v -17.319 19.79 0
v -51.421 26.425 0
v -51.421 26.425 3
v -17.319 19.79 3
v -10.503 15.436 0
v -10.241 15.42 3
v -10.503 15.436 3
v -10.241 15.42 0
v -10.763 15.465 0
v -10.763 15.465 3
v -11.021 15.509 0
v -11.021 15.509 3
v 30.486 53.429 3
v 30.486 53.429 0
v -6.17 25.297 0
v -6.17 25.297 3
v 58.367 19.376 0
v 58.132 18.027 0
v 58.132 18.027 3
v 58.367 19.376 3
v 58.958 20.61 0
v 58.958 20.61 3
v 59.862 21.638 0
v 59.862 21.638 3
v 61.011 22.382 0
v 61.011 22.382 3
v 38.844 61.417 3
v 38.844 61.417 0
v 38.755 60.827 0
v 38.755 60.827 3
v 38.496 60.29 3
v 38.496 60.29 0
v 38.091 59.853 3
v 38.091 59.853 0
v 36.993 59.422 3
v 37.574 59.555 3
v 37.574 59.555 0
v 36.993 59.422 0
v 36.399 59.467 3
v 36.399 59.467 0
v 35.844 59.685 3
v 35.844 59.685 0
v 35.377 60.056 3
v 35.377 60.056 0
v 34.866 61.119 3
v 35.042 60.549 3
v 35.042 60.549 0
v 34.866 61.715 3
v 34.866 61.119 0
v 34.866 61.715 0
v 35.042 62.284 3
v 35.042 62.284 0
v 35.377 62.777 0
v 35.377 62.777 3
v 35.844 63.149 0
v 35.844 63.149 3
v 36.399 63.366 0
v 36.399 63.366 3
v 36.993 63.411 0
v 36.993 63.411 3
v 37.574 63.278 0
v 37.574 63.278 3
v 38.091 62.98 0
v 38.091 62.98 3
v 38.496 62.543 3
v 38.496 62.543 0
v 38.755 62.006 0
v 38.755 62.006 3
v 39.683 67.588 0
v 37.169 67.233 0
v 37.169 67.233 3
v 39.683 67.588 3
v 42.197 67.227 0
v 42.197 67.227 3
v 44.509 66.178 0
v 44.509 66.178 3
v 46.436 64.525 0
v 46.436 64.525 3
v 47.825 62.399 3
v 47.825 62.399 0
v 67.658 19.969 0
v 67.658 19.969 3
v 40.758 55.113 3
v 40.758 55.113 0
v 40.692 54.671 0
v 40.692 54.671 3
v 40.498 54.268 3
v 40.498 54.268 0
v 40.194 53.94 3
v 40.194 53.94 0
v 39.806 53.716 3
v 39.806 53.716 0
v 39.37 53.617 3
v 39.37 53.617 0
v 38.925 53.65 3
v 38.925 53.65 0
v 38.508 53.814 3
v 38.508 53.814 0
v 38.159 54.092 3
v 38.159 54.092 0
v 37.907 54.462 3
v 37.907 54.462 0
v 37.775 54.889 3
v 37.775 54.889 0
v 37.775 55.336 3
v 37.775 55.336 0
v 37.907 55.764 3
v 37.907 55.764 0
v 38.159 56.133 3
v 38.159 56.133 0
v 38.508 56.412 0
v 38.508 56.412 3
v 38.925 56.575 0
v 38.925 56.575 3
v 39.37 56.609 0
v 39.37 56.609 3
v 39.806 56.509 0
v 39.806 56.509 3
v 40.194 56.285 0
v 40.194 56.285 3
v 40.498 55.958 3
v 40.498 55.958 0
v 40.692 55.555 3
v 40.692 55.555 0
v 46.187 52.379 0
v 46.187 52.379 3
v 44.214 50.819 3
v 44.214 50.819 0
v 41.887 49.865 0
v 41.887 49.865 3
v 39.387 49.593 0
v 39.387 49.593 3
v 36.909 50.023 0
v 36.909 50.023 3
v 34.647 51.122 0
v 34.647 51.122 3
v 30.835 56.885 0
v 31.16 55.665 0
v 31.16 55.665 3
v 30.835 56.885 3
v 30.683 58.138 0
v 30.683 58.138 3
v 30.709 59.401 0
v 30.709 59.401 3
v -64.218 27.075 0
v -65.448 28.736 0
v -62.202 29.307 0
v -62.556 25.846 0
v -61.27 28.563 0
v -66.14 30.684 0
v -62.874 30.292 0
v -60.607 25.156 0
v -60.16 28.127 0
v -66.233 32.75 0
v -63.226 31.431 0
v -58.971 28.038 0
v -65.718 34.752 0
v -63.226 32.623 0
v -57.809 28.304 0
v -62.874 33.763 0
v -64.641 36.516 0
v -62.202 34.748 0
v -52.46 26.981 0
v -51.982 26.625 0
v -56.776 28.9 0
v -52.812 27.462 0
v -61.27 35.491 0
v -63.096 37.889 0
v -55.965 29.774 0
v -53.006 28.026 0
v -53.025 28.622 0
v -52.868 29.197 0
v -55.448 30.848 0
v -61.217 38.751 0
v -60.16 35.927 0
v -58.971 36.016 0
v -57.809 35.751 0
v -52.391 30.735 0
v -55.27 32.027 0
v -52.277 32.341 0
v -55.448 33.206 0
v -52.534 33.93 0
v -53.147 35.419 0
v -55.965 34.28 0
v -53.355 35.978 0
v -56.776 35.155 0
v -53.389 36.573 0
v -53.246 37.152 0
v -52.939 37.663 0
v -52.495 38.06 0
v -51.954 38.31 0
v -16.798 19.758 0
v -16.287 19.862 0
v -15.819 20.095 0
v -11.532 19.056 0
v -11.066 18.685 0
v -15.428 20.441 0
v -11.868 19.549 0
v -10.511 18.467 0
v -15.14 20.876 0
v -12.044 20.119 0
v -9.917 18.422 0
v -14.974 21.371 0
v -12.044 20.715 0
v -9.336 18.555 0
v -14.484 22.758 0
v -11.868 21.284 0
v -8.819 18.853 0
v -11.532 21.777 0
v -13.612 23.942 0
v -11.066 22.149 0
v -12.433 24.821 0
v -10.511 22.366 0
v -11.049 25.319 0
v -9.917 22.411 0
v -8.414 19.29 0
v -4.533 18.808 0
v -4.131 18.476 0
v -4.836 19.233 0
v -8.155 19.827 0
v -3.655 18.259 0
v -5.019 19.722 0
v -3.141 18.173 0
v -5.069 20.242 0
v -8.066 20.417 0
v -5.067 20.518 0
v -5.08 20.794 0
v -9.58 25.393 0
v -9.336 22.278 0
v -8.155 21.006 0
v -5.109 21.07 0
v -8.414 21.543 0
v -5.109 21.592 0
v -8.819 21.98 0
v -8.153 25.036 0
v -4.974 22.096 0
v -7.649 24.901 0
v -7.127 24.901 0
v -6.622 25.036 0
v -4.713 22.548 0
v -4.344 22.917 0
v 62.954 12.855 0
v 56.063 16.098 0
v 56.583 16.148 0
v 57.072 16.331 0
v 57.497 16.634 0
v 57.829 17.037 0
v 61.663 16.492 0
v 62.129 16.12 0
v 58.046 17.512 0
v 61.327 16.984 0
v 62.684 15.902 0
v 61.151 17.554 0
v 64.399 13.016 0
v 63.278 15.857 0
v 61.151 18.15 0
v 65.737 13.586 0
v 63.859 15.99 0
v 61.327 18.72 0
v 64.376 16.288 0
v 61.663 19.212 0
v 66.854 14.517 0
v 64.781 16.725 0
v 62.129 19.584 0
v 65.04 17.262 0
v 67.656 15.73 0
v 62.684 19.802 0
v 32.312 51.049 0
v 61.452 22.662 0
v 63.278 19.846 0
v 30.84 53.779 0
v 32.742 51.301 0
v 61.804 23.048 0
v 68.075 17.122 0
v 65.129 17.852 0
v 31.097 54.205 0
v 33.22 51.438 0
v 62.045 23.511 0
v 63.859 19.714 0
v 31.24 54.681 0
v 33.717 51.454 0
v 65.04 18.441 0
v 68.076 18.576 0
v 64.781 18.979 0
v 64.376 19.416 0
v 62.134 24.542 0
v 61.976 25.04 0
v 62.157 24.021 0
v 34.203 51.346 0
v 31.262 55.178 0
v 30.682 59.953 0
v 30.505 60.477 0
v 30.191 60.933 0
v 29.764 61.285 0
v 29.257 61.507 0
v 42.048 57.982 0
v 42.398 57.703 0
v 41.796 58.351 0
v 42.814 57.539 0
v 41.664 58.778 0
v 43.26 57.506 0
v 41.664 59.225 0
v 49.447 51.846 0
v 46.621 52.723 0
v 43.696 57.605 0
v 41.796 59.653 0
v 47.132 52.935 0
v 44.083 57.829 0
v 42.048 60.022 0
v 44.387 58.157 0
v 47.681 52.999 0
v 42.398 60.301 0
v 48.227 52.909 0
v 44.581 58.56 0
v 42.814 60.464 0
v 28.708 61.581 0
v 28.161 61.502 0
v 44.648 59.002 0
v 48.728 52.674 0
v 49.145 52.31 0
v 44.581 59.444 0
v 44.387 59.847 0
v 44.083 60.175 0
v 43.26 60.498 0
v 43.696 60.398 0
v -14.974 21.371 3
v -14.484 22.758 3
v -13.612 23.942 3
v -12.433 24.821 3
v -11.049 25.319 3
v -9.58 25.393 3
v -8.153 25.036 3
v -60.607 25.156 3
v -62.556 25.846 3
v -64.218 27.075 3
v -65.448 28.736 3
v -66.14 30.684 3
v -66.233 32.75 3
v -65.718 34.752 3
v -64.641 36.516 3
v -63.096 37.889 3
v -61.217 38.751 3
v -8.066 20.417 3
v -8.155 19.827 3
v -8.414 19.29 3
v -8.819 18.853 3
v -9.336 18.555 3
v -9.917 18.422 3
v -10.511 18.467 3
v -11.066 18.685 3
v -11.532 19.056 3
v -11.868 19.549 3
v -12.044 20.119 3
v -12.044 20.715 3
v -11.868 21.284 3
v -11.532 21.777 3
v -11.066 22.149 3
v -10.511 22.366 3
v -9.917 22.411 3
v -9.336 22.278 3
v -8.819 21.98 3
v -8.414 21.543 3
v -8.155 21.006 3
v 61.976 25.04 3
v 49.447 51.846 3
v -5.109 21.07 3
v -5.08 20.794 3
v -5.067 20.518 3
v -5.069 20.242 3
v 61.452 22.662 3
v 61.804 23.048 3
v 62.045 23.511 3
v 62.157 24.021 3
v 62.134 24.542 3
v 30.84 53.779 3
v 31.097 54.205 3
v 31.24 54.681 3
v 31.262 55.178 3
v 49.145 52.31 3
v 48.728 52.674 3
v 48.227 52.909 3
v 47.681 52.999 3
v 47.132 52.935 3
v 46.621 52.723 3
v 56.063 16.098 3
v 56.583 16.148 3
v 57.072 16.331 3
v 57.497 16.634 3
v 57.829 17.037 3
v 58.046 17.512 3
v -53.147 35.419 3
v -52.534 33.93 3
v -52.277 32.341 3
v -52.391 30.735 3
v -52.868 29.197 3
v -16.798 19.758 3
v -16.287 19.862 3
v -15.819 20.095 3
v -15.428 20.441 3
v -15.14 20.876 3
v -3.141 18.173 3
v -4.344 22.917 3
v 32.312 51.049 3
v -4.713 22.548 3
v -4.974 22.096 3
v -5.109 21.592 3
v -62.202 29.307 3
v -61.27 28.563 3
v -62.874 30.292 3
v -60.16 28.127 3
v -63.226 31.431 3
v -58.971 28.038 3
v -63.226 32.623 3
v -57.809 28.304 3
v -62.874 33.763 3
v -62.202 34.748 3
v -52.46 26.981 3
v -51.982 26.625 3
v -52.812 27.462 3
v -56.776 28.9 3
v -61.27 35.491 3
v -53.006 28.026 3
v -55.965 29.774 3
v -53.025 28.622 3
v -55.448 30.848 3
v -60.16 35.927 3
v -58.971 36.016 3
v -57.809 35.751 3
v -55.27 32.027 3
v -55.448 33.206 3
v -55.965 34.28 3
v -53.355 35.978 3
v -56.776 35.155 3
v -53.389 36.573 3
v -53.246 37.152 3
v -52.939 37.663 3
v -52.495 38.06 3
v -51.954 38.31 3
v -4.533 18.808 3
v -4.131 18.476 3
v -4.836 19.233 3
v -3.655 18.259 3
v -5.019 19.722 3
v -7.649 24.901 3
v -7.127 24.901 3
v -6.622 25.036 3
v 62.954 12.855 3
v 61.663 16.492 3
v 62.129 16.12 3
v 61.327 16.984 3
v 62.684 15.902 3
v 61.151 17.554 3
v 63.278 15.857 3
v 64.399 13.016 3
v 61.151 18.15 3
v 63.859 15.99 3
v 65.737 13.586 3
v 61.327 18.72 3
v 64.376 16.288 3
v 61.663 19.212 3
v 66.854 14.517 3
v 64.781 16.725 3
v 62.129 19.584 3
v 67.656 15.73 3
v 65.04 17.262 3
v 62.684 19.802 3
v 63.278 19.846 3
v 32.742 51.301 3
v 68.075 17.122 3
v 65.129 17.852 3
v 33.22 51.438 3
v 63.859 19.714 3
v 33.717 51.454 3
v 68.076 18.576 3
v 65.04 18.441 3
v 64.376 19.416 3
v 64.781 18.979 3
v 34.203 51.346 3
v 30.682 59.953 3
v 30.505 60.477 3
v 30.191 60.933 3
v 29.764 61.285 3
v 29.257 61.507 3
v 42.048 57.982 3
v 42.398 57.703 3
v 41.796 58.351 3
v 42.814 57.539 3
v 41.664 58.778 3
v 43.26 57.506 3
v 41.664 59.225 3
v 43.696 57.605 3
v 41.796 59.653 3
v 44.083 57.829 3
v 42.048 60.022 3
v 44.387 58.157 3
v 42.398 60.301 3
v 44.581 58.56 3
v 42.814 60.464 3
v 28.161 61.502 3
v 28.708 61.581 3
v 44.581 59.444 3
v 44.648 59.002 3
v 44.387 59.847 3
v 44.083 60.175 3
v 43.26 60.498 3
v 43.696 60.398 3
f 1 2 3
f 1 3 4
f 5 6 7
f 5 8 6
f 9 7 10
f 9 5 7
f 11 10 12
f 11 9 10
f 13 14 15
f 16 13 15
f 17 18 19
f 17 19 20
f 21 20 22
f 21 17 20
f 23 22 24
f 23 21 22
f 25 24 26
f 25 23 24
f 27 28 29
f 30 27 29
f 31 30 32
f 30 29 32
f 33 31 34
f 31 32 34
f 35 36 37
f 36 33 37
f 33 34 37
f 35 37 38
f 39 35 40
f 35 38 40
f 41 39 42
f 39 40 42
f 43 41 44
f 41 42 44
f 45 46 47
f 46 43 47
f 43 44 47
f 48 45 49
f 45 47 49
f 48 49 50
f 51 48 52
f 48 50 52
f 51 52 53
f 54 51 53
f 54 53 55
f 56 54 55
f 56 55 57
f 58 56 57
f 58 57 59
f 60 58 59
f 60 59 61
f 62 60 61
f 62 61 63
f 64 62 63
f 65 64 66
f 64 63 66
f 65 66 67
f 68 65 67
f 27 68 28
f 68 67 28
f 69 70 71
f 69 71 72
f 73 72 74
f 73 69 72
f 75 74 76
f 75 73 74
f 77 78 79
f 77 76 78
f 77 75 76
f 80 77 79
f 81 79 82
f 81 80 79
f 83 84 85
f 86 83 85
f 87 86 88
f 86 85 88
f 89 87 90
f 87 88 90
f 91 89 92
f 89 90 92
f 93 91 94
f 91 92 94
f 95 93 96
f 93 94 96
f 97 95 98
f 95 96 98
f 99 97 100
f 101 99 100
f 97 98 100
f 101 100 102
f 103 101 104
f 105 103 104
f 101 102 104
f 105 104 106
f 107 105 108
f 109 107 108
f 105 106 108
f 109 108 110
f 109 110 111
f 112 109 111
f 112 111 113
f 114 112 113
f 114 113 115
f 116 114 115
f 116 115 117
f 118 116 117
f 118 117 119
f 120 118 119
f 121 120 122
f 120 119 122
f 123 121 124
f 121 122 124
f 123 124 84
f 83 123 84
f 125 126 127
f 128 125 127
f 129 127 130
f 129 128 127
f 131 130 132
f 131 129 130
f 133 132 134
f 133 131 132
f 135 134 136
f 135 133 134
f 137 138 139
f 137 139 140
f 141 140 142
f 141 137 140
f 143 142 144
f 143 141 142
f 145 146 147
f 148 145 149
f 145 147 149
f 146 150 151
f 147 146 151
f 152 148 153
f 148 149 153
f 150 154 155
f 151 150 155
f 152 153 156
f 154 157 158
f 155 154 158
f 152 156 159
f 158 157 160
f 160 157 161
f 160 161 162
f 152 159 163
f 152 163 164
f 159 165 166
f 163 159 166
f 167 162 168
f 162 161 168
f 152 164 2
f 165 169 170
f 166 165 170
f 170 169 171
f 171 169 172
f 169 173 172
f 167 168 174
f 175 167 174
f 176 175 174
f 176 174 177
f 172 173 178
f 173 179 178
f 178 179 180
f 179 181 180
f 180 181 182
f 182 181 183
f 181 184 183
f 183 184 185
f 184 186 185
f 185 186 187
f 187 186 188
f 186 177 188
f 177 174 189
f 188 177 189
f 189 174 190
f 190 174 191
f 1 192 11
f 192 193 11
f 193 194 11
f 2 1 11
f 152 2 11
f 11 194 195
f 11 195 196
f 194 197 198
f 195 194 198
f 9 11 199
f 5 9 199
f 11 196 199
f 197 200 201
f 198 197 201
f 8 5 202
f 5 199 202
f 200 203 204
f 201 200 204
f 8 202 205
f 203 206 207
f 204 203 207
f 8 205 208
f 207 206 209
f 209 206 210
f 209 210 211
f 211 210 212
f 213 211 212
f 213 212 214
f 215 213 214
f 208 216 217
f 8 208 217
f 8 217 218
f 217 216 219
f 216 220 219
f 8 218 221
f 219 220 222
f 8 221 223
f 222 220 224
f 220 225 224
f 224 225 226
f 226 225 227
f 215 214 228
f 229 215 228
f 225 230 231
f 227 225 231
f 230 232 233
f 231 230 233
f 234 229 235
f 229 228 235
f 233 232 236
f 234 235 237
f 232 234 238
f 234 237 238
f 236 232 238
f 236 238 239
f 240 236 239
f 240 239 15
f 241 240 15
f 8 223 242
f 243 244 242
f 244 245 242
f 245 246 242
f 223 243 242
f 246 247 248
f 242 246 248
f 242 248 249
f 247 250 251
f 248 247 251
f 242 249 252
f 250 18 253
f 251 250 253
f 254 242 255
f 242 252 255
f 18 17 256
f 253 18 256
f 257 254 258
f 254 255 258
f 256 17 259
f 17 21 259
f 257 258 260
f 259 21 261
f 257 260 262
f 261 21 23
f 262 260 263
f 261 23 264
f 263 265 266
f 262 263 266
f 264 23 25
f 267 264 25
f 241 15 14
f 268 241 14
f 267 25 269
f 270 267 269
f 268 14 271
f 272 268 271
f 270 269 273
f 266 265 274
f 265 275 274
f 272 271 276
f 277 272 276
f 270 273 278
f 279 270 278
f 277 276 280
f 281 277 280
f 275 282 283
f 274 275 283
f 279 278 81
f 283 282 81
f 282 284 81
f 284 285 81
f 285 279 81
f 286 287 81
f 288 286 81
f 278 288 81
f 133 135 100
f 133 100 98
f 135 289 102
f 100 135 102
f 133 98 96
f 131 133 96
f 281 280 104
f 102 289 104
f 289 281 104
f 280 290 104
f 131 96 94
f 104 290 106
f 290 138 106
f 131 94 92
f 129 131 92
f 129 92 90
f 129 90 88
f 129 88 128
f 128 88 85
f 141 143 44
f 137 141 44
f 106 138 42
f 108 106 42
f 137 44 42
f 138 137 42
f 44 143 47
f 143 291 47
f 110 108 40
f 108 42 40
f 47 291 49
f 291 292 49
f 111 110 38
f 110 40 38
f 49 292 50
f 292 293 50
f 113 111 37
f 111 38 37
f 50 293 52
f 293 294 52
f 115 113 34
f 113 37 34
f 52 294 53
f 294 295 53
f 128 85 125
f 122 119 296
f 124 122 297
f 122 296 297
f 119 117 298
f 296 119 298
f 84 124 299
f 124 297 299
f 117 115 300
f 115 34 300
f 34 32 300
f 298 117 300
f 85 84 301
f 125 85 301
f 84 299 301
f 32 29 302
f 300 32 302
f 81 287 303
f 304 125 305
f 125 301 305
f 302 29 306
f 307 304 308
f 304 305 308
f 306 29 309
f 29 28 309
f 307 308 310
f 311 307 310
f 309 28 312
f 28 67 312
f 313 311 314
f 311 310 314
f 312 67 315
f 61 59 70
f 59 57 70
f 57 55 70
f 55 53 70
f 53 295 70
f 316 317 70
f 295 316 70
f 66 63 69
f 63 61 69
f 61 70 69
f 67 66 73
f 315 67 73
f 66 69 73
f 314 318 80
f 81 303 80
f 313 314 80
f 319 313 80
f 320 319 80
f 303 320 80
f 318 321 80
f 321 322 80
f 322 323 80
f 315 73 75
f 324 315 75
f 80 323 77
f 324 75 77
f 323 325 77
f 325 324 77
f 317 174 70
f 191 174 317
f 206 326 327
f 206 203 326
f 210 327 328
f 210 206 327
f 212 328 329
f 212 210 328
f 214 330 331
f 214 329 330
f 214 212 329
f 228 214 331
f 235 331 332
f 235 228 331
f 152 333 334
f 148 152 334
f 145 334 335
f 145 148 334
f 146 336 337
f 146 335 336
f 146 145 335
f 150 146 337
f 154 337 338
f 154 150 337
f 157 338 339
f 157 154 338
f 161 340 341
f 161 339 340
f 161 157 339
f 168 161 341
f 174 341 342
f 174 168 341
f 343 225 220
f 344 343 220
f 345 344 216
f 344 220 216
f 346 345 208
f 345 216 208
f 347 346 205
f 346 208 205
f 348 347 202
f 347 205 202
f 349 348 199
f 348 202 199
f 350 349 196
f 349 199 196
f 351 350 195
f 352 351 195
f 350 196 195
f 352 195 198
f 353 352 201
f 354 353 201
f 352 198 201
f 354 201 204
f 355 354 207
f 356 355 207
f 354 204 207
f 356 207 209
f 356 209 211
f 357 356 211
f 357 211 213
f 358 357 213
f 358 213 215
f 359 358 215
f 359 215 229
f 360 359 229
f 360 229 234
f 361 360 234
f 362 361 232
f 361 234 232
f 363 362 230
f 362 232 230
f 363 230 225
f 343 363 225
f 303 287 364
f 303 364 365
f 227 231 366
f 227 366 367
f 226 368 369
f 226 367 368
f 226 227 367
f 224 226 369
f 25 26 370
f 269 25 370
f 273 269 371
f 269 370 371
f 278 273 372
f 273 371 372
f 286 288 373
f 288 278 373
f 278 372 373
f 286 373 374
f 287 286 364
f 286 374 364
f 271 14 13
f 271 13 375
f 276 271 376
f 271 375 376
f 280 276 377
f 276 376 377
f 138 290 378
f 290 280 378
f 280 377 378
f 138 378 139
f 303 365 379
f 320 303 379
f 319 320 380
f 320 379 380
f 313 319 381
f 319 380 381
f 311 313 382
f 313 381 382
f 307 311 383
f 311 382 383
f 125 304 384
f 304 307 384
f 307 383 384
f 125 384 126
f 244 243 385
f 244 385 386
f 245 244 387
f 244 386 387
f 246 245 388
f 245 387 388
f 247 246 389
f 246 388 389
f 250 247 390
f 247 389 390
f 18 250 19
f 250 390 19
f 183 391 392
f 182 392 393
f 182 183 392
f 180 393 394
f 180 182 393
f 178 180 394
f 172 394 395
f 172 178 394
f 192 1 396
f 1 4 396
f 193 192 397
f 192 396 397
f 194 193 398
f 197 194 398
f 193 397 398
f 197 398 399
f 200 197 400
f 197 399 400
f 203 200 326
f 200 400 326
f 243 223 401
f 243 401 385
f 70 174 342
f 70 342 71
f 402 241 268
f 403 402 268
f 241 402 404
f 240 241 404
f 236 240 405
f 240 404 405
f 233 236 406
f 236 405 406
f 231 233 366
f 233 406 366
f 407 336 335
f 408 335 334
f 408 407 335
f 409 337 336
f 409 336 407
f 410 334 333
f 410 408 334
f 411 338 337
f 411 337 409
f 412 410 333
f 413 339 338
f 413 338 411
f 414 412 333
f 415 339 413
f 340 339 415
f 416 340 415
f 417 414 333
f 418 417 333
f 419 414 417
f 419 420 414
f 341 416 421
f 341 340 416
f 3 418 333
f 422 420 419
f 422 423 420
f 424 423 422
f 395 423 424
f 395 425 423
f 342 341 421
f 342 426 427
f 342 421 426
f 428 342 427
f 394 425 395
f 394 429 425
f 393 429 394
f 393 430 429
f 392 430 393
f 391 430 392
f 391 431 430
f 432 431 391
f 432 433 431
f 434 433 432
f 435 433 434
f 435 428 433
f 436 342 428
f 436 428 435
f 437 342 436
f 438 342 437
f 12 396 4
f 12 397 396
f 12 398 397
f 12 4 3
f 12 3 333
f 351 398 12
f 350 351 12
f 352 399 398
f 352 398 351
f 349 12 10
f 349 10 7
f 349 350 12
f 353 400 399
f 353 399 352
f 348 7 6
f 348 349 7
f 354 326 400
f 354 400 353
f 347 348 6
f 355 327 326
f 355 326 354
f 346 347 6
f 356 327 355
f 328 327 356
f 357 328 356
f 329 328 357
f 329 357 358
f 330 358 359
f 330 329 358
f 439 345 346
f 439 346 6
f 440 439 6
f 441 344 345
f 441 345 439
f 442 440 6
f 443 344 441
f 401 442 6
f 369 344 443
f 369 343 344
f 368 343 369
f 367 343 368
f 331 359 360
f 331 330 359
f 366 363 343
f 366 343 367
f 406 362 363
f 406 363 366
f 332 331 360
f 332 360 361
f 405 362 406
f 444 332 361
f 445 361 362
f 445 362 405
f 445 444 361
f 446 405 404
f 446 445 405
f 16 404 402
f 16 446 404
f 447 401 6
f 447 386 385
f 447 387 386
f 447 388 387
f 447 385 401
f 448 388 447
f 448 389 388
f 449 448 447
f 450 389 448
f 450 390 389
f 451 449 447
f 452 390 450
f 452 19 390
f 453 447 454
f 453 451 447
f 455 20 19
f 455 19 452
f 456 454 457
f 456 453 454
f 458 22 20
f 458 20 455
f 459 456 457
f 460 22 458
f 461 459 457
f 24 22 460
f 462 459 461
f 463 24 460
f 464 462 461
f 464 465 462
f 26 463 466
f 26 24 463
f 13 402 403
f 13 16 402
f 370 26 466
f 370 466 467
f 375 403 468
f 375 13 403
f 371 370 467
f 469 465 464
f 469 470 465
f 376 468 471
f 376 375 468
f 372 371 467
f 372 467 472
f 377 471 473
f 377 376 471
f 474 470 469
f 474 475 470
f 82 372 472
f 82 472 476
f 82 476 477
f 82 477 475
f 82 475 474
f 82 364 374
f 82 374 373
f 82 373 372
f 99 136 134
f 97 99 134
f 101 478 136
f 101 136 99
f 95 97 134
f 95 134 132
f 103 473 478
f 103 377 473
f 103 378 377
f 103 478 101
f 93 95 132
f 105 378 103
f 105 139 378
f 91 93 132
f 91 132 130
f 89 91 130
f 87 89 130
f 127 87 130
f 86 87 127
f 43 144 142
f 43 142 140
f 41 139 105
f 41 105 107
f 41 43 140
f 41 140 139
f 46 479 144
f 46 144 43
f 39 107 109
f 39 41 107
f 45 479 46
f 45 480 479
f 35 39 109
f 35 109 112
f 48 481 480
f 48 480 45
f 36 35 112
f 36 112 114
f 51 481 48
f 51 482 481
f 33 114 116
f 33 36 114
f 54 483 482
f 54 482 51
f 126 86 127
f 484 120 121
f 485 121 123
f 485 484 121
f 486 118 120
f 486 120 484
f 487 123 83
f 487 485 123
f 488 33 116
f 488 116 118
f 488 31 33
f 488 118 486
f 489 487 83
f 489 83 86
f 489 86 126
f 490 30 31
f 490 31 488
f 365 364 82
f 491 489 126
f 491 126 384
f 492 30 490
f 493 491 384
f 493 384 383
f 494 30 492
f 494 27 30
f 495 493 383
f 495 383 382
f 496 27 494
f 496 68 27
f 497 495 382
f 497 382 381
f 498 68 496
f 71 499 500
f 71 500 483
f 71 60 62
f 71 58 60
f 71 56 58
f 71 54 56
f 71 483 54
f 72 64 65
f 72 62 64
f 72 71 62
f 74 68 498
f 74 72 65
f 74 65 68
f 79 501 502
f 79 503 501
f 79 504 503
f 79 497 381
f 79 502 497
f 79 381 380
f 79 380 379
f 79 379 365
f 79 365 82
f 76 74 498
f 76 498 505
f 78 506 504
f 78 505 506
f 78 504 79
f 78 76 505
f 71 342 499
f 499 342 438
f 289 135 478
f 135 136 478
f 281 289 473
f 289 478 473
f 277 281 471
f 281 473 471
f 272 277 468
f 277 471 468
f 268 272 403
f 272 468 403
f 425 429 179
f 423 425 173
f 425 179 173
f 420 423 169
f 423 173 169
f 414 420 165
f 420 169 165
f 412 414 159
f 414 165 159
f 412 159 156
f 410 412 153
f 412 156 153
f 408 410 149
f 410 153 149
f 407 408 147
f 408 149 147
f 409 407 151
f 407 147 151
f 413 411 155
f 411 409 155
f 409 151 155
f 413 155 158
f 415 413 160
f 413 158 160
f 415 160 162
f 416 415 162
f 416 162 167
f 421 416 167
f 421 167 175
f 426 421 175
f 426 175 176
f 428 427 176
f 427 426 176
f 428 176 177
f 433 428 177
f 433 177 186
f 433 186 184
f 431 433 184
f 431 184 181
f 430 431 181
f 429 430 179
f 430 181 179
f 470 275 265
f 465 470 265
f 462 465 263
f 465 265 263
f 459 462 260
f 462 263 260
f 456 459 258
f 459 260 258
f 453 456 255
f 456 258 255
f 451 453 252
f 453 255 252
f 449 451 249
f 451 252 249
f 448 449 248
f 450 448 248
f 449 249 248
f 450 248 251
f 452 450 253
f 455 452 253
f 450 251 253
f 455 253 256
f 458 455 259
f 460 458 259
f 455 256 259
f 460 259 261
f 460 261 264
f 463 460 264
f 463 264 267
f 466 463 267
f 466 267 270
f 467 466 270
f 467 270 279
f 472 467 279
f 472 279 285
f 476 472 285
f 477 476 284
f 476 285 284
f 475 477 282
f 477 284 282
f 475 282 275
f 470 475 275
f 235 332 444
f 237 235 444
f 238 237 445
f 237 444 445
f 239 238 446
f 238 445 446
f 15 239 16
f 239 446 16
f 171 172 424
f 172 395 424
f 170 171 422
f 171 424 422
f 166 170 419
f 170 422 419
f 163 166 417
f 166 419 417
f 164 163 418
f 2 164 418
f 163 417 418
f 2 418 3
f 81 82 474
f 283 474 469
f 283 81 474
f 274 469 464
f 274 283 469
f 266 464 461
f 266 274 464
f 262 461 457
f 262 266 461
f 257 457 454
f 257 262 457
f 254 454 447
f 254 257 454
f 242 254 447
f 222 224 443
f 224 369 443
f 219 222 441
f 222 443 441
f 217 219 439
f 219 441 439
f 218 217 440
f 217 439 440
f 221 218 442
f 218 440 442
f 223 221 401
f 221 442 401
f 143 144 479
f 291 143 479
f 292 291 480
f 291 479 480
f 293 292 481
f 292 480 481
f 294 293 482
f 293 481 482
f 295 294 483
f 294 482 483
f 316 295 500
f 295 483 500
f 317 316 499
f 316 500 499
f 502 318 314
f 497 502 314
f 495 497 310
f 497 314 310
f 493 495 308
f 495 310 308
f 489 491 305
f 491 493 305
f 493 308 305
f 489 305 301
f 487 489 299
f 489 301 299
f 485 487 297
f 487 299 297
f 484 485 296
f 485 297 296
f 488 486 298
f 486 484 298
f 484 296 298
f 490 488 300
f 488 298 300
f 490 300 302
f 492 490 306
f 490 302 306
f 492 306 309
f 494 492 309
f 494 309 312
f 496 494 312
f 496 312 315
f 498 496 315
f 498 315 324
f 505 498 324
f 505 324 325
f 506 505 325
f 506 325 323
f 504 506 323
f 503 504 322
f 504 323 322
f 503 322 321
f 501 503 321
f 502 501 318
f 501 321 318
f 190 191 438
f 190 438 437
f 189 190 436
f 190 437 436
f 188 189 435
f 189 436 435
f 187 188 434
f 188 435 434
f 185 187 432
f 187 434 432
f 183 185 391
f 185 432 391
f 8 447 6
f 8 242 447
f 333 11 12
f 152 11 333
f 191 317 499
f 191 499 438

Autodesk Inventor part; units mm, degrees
ref_plane "YZ Plane" through (0, 0, 0) normal (1, 0, 0) x (0, 1, 0)
ref_plane "XZ Plane" through (0, 0, 0) normal (0, 1, 0) x (-1, 0, 0)
ref_plane "XY Plane" through (0, 0, 0) normal (0, 0, 1) x (1, 0, 0)
sketch "スケッチ1" plane through (0, 0, 0) normal (0, 0, 1) x (1, 0, 0)
  circle A0 centre (-11.4931, -19.1593) radius 14 construction
  circle A1 centre (16.245, -15.3385) radius 14 construction
  line L0 (-170.915, -81.4118) -> (490.0044, -81.4118)
  line L1 (-197.2268, -33.1593) -> (179.6604, -33.1593) construction
  line L2 (-178.6504, 68.5882) -> (447.0756, 68.5882) construction
  circle A2 centre (-11.4931, -19.1593) radius 14 construction
  circle A3 centre (-21.8854, 6.8407) radius 14 construction
  circle A4 centre (-0.5211, 0.3031) radius 20.05 construction
  circle A5 centre (-0.5211, 0.3031) radius 22.3421 construction
  circle A6 centre (0, 0) radius 22.3421 construction
  circle A7 centre (-0.5211, 0.3031) radius 5.05 construction
  circle A8 centre (19.689, 29.6103) radius 30.55 construction
  circle A9 centre (19.689, 29.6103) radius 10.1 construction
  circle A10 centre (39.672, 58.5882) radius 25.1 construction
  line L3 (-0.5211, 0.3031) -> (39.672, 58.5882) construction
  circle A11 centre (39.672, 58.5882) radius 27.1 construction
  circle A12 centre (19.689, 29.6103) radius 31.55 construction
  circle A13 centre (19.689, 29.6103) radius 12.1 construction
  circle A14 centre (-0.5211, 0.3031) radius 20.55 construction
  circle A15 centre (-0.5211, 0.3031) radius 6.05 construction
  circle A16 centre (36.8436, 61.4166) radius 4 construction
  circle A17 centre (36.8436, 61.4166) radius 2
  line L4 (36.8436, 61.4166) -> (39.672, 58.5882)
  line L5 (39.672, 58.5882) -> (22.909, 61.4166) construction
  circle A18 centre (22.909, 61.4166) radius 2
  circle A19 centre (22.909, 61.4166) radius 5
  line L6 (28.2635, 50.4737) -> (31.5576, 69.9968) construction
  line L7 (31.5576, 69.9968) -> (51.0806, 66.7027) construction
  line L8 (51.0806, 66.7027) -> (47.7865, 47.1796) construction
  line L9 (47.7865, 47.1796) -> (28.2635, 50.4737) construction
  circle A20 centre (39.672, 58.5882) radius 9
  circle A21 centre (28.2635, 50.4737) radius 2.5
  circle A22 centre (47.7865, 47.1796) radius 2.5
  circle A23 centre (51.0806, 66.7027) radius 2.5
  circle A24 centre (31.5576, 69.9968) radius 2.5
  circle A25 centre (28.2635, 50.4737) radius 5
  line L10 (22.909, 61.4166) -> (36.8436, 61.4166) construction
  line L11 (-26.0808, 51.4166) -> (-426.0808, 51.4166)
  line L12 (-26.0808, 24.4166) -> (23.9192, 24.4166)
  circle A26 centre (39.672, 58.5882) radius 17.5
  circle A27 centre (47.7865, 47.1796) radius 2.1
  circle A28 centre (28.2635, 50.4737) radius 2.1
  circle A29 centre (31.5576, 69.9968) radius 2.1
  circle A30 centre (51.0806, 66.7027) radius 2.1
  circle A31 centre (47.7865, 47.1796) radius 5
  circle A32 centre (31.5576, 69.9968) radius 5
  circle A33 centre (51.0806, 66.7027) radius 5
  circle A34 centre (39.672, 58.5882) radius 19.5
  circle A35 centre (39.672, 58.5882) radius 20.5
  line L13 (20.7504, 89.6882) -> (53.4998, 89.6882)
  line L14 (53.4998, 89.6882) -> (73.6516, 68.9857)
  line L15 (20.7504, 89.6882) -> (-13.977, 39.0272)
  circle A36 centre (-59.2702, 32.0272) radius 5.025 construction
  circle A37 centre (-59.2702, 32.0272) radius 4
  arc A38 (-59.2702, 39.0272) -> (-62.5897, 25.8643) centre (-59.2702, 32.0272) ccw
  line L16 (-59.2702, 39.0272) -> (-13.977, 39.0272)
  line L17 (-62.5897, 25.8643) -> (-36.5547, 11.8407)
  line L18 (-36.5547, 11.8407) -> (-36.5547, -33.1593)
  arc A39 (74.5655, 64.0796) -> (73.6516, 68.9857) centre (70.4271, 65.8469) ccw
  circle A40 centre (8.5193, 63.8863) radius 4.5 construction
  arc A41 (59.4085, 28.8085) -> (59.8353, 29.5856) centre (55.6969, 31.3528) ccw
  circle A42 centre (23.6647, -6.2198) radius 4.5
  circle A43 centre (-16.0241, 34.5272) radius 4.5 construction
  line L19 (59.8353, 29.5856) -> (74.5655, 64.0796)
  line L20 (32.172, 89.6882) -> (32.172, 92.6882)
  line L21 (32.172, 92.6882) -> (47.172, 92.6882)
  line L22 (47.172, 92.6882) -> (47.172, 89.6882)
  line L23 (35.172, 89.6882) -> (35.172, 86.6882)
  line L24 (35.172, 86.6882) -> (44.172, 86.6882)
  line L25 (44.172, 86.6882) -> (44.172, 89.6882)
  circle A44 centre (70.4271, 65.8469) radius 1.5
  circle A45 centre (55.6969, 31.3528) radius 1.5
  circle A46 centre (23.6647, -6.2198) radius 1.5
  circle A47 centre (-16.0241, 34.5272) radius 1.5
  circle A48 centre (8.5193, 63.8863) radius 1.5
  circle A49 centre (-10.0662, 20.4166) radius 4 construction
  circle A50 centre (-10.0662, 20.4166) radius 2
  line L26 (1.9305, -36.1593) -> (16.9305, -36.1593)
  line L27 (16.9305, -36.1593) -> (16.9305, -33.1593)
  line L28 (1.9305, -33.1593) -> (1.9305, -36.1593)
  arc A51 (1.9305, -33.1593) -> (-0.1695, -33.1593) centre (0.8805, -33.1593) ccw
  line L29 (13.9305, -30.1593) -> (13.9305, -33.1593)
  arc A52 (13.9305, -30.1593) -> (11.8305, -30.1593) centre (12.8805, -30.1593) ccw
  line L30 (7.0305, -30.1593) -> (11.8305, -30.1593)
  arc A53 (7.0305, -30.1593) -> (4.9305, -30.1593) centre (5.9805, -30.1593) ccw
  line L31 (4.9305, -33.1593) -> (4.9305, -30.1593)
  arc A54 (4.9305, -33.1593) -> (7.0305, -33.1593) centre (5.9805, -33.1593) ccw
  arc A55 (11.8305, -33.1593) -> (13.9305, -33.1593) centre (12.8805, -33.1593) ccw
  line L32 (-36.5547, -36.1593) -> (-21.5547, -36.1593)
  line L33 (-21.5547, -36.1593) -> (-21.5547, -33.1593)
  arc A56 (-19.4547, -33.1593) -> (-21.5547, -33.1593) centre (-20.5047, -33.1593) ccw
  line L34 (-36.5547, -33.1593) -> (-36.5547, -36.1593)
  arc A57 (-33.5547, -33.1593) -> (-31.4547, -33.1593) centre (-32.5047, -33.1593) ccw
  line L35 (-33.5547, -33.1593) -> (-33.5547, -30.1593)
  arc A58 (-31.4547, -30.1593) -> (-33.5547, -30.1593) centre (-32.5047, -30.1593) ccw
  line L36 (-31.4547, -30.1593) -> (-26.6547, -30.1593)
  arc A59 (-24.5547, -30.1593) -> (-26.6547, -30.1593) centre (-25.6047, -30.1593) ccw
  line L37 (-24.5547, -30.1593) -> (-24.5547, -33.1593)
  arc A60 (-26.6547, -33.1593) -> (-24.5547, -33.1593) centre (-25.6047, -33.1593) ccw
  line L38 (59.4085, 28.8085) -> (16.9305, -33.1593)
  circle A61 centre (-21.8854, 6.8407) radius 5
  circle A62 centre (-11.4931, -19.1593) radius 5
  line L39 (-31.4547, -33.1593) -> (-26.6547, -33.1593)
  line L40 (-19.4547, -33.1593) -> (-0.1695, -33.1593)
  line L41 (7.0305, -33.1593) -> (11.8305, -33.1593)
  line L42 (0.4485, -25.8914) -> (-27.1419, -10.3373) construction
  line L43 (-27.1419, -10.3373) -> (-17.3768, 21.5744) construction
  circle A63 centre (-21.8854, 6.8407) radius 8
  circle A64 centre (-11.4931, -19.1593) radius 8
  circle A65 centre (-19.5445, 14.4905) radius 1.3
  circle A66 centre (-24.2262, -0.8092) radius 1.3
  circle A67 centre (-18.4619, -15.2306) radius 1.3
  circle A68 centre (-4.5242, -23.088) radius 1.3
  circle A69 centre (-0.5211, 0.3031) radius 4.5
  circle A70 centre (19.689, 29.6103) radius 6
  arc A71 (65.9325, 14.9991) -> (66.6936, 19.6662) centre (63.1287, 17.8519) ccw
  line L44 (16.9305, -33.1593) -> (65.9325, 14.9991)
  line L45 (66.6936, 19.6662) -> (60.6612, 31.5196)
  circle A72 centre (63.1287, 17.8519) radius 2
  dimension "d0" = 150
  dimension "d1" = 28
  dimension "d2" = 28
  dimension "d3" = 40.1
  dimension "d4" = 10.1
  dimension "d5" = 61.1
  dimension "d6" = 20.2
  dimension "d7" = 50.2
  dimension "d8" = 10
  dimension "d9" = 2
  dimension "d10" = 1
  dimension "d11" = 2
  dimension "d12" = 0.5
  dimension "d13" = 1
  dimension "d14" = 40
  dimension "d15" = 8
  dimension "d16" = 4
  dimension "d17" = 4
  dimension "d18" = 45
  dimension "d19" = 17
  dimension "d20" = 4
  dimension "d21" = 3
  dimension "d22" = 1
  dimension "d23" = 5
  dimension "d24" = 5
  dimension "d25" = 5
  dimension "d26" = 5
  dimension "d27" = 10
  dimension "d28" = 400
  dimension "d29" = 10
  dimension "d30" = 50
  dimension "d31" = 50
  dimension "d32" = 27
  dimension "d33" = 27
  dimension "d34" = 35
  dimension "d35" = 4.2
  dimension "d36" = 4.2
  dimension "d37" = 4.2
  dimension "d38" = 4.2
  dimension "d39" = 10
  dimension "d40" = 10
  dimension "d41" = 10
  dimension "d42" = 2
  dimension "d43" = 1
  dimension "d44" = 8
  dimension "d45" = 3
  dimension "d46" = 4
  dimension "d47" = 9
  dimension "d48" = 9
  dimension "d49" = 9
  dimension "d50" = 9
  dimension "d51" = 9
  dimension "d52" = 3
  dimension "d53" = 15
  dimension "d54" = 3
  dimension "d55" = 9
  dimension "d56" = 3
  dimension "d57" = 7.5
  dimension "d58" = 3
  dimension "d59" = 3
  dimension "d60" = 3
  dimension "d61" = 3
  dimension "d62" = 3
  dimension "d63" = 8
sketch "スケッチ2" plane through (0, 0, 0) normal (0, 0, 1) x (1, 0, 0)
  circle A0 centre (-59.2702, 32.0272) radius 4 projected
  circle A1 centre (63.1287, 17.8519) radius 2 projected
  circle A2 centre (-10.0662, 20.4166) radius 2 projected
  circle A3 centre (36.8436, 61.4166) radius 2 projected
  arc A4 (-61.2167, 38.7511) -> (-60.607, 25.156) centre (-59.2702, 32.0272) ccw
  arc A5 (-11.0211, 15.5087) -> (-10.2413, 15.4197) centre (-10.0662, 20.4166) ccw
  arc A6 (62.9536, 12.855) -> (67.6583, 19.9692) centre (63.1287, 17.8519) ccw
  circle A7 centre (39.672, 58.5882) radius 9 projected
  circle A8 centre (39.672, 58.5882) radius 7 construction
  circle A9 centre (43.1475, 59.0018) radius 1.5
  circle A10 centre (39.2584, 55.1127) radius 1.5
  line L0 (43.1475, 59.0018) -> (39.2584, 55.1127) construction
  line L1 (39.2584, 55.1127) -> (36.8436, 61.4166) construction
  line L2 (36.8436, 61.4166) -> (43.1475, 59.0018) construction
  line L3 (36.8436, 61.4166) -> (41.203, 57.0573) construction
  line L4 (-61.2167, 38.7511) -> (37.1693, 67.2332)
  line L5 (47.8253, 62.3993) -> (67.6583, 19.9692)
  line L6 (62.9536, 12.855) -> (-10.2413, 15.4197)
  line L7 (-11.0211, 15.5087) -> (-60.607, 25.156)
  line L8 (39.672, 58.5882) -> (-10.0662, 20.4166) construction
  line L9 (38.7588, 59.7782) -> (-10.9794, 21.6066)
  line L10 (-9.1529, 19.2267) -> (40.5853, 57.3982)
  arc A11 (40.5853, 57.3982) -> (38.7588, 59.7782) centre (39.672, 58.5882) ccw
  arc A12 (-10.9794, 21.6066) -> (-9.1529, 19.2267) centre (-10.0662, 20.4166) ccw
  line L11 (38.0036, 64.3516) -> (-60.3825, 35.8694)
  arc A13 (-60.3825, 35.8694) -> (-60.0341, 28.1008) centre (-59.2702, 32.0272) ccw
  line L12 (-60.0341, 28.1008) -> (-10.4481, 18.4534)
  arc A14 (-10.4481, 18.4534) -> (-10.1362, 18.4179) centre (-10.0662, 20.4166) ccw
  line L13 (-10.1362, 18.4179) -> (63.0587, 15.8532)
  arc A15 (63.0587, 15.8532) -> (64.9406, 18.6989) centre (63.1287, 17.8519) ccw
  line L14 (64.9406, 18.6989) -> (45.1075, 61.1289)
  circle A16 centre (-59.2702, 32.0272) radius 7
  circle A17 centre (-10.0662, 20.4166) radius 5
  circle A18 centre (63.1287, 17.8519) radius 5
  point P0 (0, 0)
  point P1 (14.8029, 39.5024)
  point P2 (-7.1956, 24.5105)
  point P3 (-14.9464, 19.3286)
  point P4 (-54.3952, 27.0037)
  point P5 (-54.8645, 37.4668)
  point P6 (31.5599, 62.4862)
  point P7 (31.7189, 54.3754)
  point P8 (-5.5565, 18.2574)
  point P9 (-5.3691, 22.1306)
  point P10 (33.5454, 51.9955)
  point P11 (47.9481, 55.0518)
  point P12 (63.0001, 22.8503)
  point P13 (58.4789, 16.0136)
  dimension "d77" = 3
  dimension "d78" = 3
  dimension "d80" = 3
  dimension "d82" = 14
  dimension "d83" = 3
  dimension "d84" = 3
  dimension "d85" = 5.5
  dimension "d86" = 3.5
  dimension "d87" = 3
  dimension "d88" = 3
  dimension "d89" = 3
  dimension "d90" = 3
  dimension "d91" = 3
extrude "押し出し1" add sketch "スケッチ2" along normal blind 3 contours A0 L11 A16 L12 | A0 L12 A16 A4 L11 | A16 L4 A7 L11 | L12 A17 L7 A16 | A7 L10 A10 A11 L9 | A17 L9 A2 L12 | L12 A2 L13 A17 A5 | L9 A11 L10 A10 A7 | A7 L10 A17 L9 | A17 L10 A2 L9 | L5 A18 L14 A7 | A2 L10 A17 L13 | A17 L13 A18 L6 | A6 A18 L13 A1 L14 | L14 A1 L13 A18
fillet "フィレット1" radius 2 12 edges at (-5.5565, 18.2574, 1.5) (-5.3691, 22.1306, 1.5) (58.4789, 16.0136, 1.5) (63.0001, 22.8503, 1.5) (47.9481, 55.0518, 1.5) (33.5454, 51.9955, 1.5) (-7.1956, 24.5105, 1.5) (-14.9464, 19.3286, 1.5) (31.7189, 54.3754, 1.5) (31.5599, 62.4862, 1.5) (-54.8645, 37.4668, 1.5) (-54.3952, 27.0037, 1.5)
properties part number "横回転首振りフレーム３" material "アルミニウム 2014-T4"
